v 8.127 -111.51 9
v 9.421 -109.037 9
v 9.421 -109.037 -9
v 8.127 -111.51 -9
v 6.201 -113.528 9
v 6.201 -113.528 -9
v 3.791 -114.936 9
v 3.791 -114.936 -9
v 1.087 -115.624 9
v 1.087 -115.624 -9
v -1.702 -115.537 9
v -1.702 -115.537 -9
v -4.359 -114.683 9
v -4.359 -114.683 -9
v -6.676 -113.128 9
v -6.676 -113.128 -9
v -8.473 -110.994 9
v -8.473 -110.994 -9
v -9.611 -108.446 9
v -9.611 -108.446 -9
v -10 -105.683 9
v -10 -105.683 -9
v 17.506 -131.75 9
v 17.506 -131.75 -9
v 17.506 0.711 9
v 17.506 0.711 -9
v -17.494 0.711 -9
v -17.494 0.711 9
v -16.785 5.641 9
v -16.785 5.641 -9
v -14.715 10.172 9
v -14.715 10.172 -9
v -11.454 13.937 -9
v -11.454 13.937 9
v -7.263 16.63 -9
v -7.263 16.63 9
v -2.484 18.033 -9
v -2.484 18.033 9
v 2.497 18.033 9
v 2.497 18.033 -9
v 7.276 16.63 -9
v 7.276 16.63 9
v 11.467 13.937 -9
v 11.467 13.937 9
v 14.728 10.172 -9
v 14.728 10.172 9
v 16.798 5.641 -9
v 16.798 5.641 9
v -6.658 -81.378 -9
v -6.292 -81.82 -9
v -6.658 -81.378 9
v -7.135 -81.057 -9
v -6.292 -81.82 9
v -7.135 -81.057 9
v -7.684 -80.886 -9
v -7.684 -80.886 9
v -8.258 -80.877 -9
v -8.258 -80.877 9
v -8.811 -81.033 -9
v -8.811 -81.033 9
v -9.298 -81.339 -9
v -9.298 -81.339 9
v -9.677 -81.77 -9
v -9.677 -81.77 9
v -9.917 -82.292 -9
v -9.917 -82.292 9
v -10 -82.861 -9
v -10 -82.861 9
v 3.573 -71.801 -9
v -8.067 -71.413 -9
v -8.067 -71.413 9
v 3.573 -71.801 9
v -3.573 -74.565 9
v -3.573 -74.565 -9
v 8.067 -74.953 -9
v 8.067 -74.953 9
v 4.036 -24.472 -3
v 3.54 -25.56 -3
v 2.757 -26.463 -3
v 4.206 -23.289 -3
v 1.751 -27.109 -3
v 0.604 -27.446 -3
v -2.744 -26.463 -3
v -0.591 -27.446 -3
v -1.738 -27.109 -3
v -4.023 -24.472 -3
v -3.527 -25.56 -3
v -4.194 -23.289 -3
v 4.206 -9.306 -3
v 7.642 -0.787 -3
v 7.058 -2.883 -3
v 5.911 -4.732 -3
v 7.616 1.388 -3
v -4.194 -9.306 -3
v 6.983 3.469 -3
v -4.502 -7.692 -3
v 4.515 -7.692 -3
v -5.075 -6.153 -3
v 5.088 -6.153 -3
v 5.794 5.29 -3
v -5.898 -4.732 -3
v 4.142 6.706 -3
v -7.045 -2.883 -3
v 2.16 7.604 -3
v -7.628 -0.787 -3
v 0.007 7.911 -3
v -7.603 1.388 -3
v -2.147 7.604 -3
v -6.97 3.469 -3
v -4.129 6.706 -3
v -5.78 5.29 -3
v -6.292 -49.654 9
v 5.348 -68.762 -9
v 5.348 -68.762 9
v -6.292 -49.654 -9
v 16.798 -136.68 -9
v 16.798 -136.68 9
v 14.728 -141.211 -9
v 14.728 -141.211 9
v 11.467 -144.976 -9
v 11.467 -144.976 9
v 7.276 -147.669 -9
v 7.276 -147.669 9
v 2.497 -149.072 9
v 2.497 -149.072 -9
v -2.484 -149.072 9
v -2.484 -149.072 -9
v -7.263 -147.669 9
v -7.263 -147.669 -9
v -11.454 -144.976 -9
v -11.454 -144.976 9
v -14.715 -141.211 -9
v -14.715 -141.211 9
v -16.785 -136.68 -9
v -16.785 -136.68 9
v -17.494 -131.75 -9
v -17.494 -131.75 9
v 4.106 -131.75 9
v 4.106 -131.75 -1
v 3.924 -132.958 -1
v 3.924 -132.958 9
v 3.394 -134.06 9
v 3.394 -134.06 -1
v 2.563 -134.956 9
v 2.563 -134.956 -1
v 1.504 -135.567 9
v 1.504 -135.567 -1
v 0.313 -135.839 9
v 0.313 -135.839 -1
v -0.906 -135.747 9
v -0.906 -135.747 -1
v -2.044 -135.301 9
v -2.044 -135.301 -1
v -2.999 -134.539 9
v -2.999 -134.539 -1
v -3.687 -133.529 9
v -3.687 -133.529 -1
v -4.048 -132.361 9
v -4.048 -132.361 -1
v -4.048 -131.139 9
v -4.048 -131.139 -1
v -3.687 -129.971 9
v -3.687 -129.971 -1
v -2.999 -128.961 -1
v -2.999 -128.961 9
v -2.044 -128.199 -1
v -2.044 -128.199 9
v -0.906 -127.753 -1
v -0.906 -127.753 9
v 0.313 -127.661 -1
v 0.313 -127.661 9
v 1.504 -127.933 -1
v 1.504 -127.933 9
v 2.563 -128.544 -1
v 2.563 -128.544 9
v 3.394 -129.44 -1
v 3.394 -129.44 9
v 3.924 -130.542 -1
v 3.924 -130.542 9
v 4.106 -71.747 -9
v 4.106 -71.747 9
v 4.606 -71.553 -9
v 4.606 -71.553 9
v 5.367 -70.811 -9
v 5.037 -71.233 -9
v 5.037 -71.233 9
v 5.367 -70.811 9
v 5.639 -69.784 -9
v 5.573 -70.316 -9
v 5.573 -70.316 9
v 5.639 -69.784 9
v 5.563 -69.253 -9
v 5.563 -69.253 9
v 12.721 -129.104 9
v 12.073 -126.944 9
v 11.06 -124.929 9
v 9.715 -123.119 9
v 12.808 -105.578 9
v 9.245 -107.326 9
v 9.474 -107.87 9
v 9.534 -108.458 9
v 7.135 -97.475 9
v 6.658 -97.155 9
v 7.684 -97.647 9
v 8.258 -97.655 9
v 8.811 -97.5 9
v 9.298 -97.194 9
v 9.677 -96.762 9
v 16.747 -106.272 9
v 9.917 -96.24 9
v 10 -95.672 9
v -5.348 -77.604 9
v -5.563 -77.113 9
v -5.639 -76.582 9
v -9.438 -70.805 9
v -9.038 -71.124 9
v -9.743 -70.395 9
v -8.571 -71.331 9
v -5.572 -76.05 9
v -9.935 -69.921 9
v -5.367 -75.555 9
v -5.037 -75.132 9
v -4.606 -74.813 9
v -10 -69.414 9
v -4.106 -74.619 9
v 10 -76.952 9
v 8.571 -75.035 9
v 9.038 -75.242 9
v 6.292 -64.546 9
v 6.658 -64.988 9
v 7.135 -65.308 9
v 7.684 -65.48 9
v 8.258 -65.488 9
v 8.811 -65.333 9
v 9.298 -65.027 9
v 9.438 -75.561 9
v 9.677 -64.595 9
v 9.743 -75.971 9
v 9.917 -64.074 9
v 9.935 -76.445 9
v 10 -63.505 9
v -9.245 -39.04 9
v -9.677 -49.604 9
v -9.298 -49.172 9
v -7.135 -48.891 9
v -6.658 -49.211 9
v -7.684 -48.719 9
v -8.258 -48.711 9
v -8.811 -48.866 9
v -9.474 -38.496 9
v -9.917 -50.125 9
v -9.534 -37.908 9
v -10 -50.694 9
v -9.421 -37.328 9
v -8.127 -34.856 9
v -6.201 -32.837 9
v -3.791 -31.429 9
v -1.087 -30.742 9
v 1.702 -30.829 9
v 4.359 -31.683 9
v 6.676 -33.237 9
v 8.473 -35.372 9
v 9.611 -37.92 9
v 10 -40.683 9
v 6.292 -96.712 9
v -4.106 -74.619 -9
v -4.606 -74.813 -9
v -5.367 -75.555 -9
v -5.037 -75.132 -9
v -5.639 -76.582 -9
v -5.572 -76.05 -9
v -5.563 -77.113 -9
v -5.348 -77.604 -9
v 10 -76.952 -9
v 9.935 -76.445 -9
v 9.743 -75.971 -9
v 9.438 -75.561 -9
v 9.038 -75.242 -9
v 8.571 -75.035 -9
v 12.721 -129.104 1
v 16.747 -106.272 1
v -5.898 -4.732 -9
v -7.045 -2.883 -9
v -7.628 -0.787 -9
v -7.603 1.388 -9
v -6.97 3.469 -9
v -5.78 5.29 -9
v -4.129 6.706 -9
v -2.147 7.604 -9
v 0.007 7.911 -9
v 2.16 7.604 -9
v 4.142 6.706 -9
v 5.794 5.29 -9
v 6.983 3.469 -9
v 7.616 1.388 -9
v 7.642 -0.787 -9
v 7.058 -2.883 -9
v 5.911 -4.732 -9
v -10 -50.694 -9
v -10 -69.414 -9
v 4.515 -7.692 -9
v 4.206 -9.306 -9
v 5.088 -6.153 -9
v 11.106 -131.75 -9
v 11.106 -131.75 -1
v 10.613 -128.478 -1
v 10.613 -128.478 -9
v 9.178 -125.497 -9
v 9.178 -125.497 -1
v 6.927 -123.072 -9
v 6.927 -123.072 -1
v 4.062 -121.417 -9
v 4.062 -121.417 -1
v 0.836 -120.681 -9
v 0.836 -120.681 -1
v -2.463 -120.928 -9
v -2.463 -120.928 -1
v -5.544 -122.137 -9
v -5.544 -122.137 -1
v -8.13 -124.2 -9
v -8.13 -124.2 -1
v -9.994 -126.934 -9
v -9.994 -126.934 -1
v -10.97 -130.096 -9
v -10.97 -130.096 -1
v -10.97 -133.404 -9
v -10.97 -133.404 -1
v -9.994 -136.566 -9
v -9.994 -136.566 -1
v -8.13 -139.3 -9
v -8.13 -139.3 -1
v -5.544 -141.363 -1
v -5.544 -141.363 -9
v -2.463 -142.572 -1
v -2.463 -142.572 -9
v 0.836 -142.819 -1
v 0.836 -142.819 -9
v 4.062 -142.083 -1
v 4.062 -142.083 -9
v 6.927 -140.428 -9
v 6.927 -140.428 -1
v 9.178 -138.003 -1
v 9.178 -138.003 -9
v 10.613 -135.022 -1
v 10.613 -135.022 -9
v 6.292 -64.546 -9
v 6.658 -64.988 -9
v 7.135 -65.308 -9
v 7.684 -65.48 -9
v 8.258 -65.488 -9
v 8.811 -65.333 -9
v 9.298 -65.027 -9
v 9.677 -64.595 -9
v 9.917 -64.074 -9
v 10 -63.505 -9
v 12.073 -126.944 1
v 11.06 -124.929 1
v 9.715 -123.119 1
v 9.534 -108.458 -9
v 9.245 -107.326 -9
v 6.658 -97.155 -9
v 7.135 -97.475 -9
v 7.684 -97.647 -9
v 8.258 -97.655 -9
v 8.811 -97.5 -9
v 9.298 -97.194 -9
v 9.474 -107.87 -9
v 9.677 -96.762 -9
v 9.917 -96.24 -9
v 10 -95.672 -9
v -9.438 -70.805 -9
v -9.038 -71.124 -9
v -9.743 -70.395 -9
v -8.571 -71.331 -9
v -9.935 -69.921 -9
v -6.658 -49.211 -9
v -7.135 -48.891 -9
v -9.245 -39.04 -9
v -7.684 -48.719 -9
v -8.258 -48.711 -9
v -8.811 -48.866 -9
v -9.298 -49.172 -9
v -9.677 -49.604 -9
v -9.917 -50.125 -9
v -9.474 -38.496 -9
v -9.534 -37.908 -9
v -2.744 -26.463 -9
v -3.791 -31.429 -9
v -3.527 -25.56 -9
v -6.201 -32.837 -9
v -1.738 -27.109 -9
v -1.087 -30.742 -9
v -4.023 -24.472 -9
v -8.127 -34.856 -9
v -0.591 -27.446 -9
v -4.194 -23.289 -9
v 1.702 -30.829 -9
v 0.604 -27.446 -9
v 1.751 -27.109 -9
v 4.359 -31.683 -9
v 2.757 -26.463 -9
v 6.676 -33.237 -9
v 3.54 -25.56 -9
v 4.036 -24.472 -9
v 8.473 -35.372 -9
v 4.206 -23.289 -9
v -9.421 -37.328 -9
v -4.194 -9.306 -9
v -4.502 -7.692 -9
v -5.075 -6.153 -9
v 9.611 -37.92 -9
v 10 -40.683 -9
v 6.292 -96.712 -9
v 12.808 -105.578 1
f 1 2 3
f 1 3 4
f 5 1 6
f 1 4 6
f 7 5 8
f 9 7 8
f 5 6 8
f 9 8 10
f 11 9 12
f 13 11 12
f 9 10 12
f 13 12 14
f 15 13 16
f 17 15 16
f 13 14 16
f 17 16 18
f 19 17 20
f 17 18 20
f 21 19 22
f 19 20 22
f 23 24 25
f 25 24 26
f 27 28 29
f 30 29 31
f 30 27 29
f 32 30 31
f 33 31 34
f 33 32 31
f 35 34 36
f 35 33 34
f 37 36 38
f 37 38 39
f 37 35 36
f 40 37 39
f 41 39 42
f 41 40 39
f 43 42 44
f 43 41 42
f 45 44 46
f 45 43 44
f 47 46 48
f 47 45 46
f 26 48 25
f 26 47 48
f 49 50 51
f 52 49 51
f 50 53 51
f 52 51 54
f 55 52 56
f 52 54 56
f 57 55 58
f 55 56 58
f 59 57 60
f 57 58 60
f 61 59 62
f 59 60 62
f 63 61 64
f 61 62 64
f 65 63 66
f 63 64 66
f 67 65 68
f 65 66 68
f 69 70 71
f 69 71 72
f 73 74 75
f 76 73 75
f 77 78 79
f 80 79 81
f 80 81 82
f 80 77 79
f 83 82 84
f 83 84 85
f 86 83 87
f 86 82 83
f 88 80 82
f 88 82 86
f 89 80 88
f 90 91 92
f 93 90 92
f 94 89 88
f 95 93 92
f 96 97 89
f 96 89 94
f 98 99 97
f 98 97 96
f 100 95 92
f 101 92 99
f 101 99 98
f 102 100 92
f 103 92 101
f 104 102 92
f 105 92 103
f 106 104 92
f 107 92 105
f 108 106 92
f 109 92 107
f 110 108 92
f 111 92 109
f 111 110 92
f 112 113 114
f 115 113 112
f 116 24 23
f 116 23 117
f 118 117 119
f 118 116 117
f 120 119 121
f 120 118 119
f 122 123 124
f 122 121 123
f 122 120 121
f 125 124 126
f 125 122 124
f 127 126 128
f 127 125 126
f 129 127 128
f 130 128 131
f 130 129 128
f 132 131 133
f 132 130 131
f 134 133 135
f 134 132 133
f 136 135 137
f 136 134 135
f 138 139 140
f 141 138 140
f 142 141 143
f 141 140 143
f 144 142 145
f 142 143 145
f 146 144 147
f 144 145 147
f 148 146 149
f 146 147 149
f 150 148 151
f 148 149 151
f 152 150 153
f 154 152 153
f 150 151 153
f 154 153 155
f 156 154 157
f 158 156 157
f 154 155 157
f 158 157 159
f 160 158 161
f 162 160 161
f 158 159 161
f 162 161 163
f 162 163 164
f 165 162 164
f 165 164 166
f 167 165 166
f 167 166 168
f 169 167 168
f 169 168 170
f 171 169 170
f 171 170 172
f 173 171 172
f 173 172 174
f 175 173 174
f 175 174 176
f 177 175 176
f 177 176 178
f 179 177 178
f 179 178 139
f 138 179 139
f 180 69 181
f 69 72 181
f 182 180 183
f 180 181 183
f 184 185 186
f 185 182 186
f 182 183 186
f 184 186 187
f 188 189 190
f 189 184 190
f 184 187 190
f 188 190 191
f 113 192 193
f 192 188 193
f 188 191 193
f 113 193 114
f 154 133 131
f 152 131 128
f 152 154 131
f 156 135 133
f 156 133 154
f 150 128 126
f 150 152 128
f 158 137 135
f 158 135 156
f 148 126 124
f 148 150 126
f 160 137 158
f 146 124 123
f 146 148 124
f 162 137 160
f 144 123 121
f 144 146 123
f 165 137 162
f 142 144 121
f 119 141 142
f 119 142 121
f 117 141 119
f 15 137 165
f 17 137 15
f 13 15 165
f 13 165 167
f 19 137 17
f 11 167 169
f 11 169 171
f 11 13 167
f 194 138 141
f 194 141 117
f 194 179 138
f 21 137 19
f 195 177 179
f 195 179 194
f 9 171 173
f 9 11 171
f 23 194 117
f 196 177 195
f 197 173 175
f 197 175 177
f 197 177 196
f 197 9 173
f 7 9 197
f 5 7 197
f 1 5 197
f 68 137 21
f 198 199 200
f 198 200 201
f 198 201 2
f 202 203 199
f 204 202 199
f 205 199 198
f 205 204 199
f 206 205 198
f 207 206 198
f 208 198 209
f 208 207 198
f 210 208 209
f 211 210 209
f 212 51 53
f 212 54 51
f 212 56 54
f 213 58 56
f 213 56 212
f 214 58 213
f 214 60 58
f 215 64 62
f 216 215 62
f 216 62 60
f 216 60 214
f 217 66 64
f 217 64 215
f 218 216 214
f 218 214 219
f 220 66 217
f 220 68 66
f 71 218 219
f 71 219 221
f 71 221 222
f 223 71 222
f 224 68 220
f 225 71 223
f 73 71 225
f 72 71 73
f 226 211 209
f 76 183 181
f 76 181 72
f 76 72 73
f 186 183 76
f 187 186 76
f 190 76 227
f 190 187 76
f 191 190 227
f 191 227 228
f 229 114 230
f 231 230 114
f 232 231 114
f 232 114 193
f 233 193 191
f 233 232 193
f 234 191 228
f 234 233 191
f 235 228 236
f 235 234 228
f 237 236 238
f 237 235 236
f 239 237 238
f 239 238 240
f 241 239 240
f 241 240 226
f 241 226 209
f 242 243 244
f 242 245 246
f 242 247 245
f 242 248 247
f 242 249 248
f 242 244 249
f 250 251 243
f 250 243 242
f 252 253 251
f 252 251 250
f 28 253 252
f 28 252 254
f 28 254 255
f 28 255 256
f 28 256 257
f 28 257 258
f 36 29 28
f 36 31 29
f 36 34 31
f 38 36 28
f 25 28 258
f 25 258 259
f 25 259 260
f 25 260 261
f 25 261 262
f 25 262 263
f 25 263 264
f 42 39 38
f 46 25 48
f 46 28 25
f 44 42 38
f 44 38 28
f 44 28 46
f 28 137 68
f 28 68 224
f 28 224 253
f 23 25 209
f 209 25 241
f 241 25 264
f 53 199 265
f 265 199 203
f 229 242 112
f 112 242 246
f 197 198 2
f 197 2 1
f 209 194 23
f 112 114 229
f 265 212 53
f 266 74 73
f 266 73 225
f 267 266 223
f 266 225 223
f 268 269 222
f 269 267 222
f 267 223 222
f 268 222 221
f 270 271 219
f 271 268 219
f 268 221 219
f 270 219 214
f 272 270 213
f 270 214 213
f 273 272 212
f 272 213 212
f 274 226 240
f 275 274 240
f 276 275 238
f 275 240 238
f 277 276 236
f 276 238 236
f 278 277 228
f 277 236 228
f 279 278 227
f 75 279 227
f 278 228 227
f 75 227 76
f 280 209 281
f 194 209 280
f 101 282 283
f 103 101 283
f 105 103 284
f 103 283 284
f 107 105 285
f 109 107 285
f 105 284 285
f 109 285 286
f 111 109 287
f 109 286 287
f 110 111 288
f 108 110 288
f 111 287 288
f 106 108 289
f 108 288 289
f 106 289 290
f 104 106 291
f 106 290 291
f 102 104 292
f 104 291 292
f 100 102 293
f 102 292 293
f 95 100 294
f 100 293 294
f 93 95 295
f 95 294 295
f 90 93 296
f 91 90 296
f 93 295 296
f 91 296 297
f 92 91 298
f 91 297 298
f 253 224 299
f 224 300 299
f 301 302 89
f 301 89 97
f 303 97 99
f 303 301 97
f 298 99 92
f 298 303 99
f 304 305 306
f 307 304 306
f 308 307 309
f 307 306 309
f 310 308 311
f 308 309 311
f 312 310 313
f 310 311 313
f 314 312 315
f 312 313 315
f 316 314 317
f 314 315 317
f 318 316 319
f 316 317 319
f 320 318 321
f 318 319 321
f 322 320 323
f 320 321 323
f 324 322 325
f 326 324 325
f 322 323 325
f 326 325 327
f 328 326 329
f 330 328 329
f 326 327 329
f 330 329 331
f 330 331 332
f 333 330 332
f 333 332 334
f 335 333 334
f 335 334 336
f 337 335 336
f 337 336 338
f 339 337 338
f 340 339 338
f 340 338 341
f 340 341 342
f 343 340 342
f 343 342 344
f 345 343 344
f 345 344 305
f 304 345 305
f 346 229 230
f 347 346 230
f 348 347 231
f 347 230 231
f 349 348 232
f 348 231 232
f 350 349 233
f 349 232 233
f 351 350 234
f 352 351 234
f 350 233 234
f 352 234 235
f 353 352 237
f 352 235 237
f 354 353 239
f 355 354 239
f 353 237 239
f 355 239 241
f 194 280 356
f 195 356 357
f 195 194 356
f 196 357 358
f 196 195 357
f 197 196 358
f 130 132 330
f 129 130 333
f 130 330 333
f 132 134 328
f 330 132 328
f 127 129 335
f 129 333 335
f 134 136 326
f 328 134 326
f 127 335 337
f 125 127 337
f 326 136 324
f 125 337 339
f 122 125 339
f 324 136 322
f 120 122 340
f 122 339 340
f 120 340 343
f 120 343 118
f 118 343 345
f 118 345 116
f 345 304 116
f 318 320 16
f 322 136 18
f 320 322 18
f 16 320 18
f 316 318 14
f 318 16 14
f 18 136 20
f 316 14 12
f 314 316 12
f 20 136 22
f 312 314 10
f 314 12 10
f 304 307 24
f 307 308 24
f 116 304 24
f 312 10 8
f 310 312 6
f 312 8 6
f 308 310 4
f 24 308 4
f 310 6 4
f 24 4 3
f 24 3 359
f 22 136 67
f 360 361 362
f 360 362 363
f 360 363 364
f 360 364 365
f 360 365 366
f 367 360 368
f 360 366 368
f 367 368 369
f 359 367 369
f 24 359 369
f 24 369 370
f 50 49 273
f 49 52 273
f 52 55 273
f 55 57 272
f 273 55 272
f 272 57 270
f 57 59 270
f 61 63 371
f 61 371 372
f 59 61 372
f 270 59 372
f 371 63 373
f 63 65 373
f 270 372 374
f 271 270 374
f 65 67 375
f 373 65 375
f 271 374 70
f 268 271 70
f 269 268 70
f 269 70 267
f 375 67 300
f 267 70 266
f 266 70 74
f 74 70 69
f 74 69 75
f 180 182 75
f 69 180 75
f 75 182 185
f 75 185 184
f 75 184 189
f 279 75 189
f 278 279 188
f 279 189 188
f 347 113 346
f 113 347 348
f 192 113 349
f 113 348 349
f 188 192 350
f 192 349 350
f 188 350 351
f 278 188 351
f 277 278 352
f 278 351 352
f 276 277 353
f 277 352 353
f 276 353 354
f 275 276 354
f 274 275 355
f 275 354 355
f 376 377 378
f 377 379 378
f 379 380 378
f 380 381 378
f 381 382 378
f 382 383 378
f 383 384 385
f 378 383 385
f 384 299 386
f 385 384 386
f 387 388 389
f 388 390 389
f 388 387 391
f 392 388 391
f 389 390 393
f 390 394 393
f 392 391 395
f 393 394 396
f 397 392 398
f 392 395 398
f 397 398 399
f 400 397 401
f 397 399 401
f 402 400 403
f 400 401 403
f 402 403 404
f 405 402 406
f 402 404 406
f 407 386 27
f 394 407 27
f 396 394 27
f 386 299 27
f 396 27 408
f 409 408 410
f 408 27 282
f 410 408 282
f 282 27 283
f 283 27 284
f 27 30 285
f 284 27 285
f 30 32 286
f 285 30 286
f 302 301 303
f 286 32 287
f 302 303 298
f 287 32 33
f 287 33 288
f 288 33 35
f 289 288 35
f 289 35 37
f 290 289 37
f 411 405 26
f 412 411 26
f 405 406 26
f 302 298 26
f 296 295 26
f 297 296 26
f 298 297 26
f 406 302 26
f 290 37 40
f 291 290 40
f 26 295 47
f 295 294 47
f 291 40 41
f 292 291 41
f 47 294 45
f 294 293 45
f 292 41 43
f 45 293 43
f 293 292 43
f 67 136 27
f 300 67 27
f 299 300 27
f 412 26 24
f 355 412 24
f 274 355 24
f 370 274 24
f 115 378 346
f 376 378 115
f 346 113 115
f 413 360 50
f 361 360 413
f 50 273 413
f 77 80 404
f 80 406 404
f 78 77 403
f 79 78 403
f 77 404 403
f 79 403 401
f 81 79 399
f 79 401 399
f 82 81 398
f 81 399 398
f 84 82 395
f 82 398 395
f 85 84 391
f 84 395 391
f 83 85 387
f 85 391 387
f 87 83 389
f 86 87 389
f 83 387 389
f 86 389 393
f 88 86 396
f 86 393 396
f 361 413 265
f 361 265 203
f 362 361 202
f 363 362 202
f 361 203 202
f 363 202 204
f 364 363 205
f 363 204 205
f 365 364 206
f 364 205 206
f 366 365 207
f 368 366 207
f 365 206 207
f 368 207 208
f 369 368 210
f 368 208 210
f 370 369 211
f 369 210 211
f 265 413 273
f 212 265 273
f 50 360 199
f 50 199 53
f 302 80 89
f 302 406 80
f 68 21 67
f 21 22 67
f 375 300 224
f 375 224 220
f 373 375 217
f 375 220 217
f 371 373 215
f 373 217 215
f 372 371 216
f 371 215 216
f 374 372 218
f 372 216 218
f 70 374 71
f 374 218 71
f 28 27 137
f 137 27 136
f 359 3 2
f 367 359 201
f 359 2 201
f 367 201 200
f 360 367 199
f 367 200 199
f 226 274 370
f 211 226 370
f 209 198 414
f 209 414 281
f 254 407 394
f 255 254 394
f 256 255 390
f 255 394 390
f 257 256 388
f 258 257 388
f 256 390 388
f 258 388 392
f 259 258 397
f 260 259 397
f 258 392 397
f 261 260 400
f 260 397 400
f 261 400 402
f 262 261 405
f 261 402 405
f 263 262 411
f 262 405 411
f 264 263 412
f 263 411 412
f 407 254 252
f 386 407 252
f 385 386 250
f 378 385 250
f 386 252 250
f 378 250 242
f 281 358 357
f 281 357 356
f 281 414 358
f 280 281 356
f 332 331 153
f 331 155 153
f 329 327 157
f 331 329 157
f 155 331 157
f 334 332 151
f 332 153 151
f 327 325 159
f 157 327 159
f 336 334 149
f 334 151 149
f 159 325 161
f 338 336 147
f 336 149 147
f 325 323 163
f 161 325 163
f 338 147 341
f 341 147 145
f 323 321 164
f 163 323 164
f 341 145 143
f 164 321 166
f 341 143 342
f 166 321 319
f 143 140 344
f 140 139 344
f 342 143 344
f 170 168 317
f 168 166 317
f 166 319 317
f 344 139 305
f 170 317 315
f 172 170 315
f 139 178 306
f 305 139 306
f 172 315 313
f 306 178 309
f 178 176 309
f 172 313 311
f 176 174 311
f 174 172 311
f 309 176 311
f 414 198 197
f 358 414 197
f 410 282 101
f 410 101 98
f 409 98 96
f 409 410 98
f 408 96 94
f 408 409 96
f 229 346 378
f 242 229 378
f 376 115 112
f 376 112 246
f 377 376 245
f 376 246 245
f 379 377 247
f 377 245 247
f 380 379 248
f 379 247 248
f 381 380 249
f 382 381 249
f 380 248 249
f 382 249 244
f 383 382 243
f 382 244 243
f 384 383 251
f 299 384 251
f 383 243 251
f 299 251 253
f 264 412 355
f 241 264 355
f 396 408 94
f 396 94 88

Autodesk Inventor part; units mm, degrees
ref_plane "YZ Plane" through (0, 0, 0) normal (1, 0, 0) x (0, 1, 0)
ref_plane "XZ Plane" through (0, 0, 0) normal (0, 1, 0) x (-1, 0, 0)
ref_plane "XY Plane" through (0, 0, 0) normal (0, 0, 1) x (1, 0, 0)
sketch "Sketch1" plane through (0, 0, 0) normal (0, 0, 1) x (1, 0, 0)
  line L0 (0.0065, 132.461) -> (0.0065, 0) construction
  line L1 (-17.4935, 132.461) -> (-17.4935, 0)
  line L2 (17.5065, 0) -> (17.5065, 132.461)
  arc A0 (17.5065, 132.461) -> (-17.4935, 132.461) centre (0.0065, 132.461) ccw
  arc A1 (-17.4935, 0) -> (17.5065, 0) centre (0.0065, 0) ccw
  circle A2 centre (0.0065, 0) radius 11.1
  circle A3 centre (0.0065, 131.961) radius 7.5
  line L3 (4.0065, 131.961) -> (4.0065, 109.961)
  line L4 (4.0065, 109.961) -> (-3.9935, 109.961)
  line L5 (-3.9935, 109.961) -> (-3.9935, 131.961)
  line L6 (-3.9935, 131.961) -> (4.0065, 131.961)
  line L7 (0.0065, 101.721) -> (0.0065, -30.5)
  line L8 (0.0065, 131.961) -> (5.7519, 127.1401)
  line L9 (0.0065, 131.961) -> (0.0065, 124.461) construction
  arc A4 (5.7519, 127.1401) -> (4.0065, 122.4546) centre (13.9526, 121.4175) ccw
  line L10 (0.0065, 131.961) -> (-5.7388, 127.1401)
  arc A5 (-3.9935, 122.4546) -> (-5.7388, 127.1401) centre (-13.9395, 121.4175) ccw
  line L11 (0.0065, 132.461) -> (0.0065, 108.461) construction
  line L12 (4.0065, 132.461) -> (4.0065, 108.461)
  line L13 (-3.9935, 108.461) -> (-3.9935, 132.461)
  arc A6 (4.0065, 132.461) -> (-3.9935, 132.461) centre (0.0065, 132.461) ccw
  arc A7 (-3.9935, 108.461) -> (4.0065, 108.461) centre (0.0065, 108.461) ccw
  point P0 (0.0065, 131.961)
  point P1 (-3.9935, 122.4546)
  point P2 (-5.7388, 127.1401)
  point P3 (0.0065, 120.461)
  point P4 (-3.9935, 109.961)
  point P5 (4.0065, 109.961)
  dimension "d38" = 15
  dimension "d19" = 35
  dimension "d20" = 22.2
  dimension "d39" = 22
  dimension "d40" = 8
  dimension "d41" = 4
  dimension "d42" = 4
  dimension "d43" = 50
  dimension "d44" = 5
  dimension "d45" = 10
  dimension "d50" = 24
  dimension "d59" = 132.461
extrude "Extrusion1" add sketch "Sketch1" along normal mid plane 6
sketch "Sketch6" plane through (0, 0, 3) normal (0, 0, 1) x (1, 0, 0)
  arc A0 (-17.4935, 0) -> (17.5065, 0) centre (0.0065, 0) ccw projected
  line L0 (17.5065, 0) -> (17.5065, 132.461) projected
  arc A1 (17.5065, 132.461) -> (-17.4935, 132.461) centre (0.0065, 132.461) ccw projected
  line L1 (-17.4935, 132.461) -> (-17.4935, 0) projected
  arc A2 (-3.9935, 108.461) -> (4.0065, 108.461) centre (0.0065, 108.461) ccw projected
  line L2 (-3.9935, 108.461) -> (-3.9935, 122.4546) projected
  arc A3 (-3.9935, 122.4546) -> (-5.7388, 127.1401) centre (-13.9395, 121.4175) ccw projected
  arc A4 (5.7519, 127.1401) -> (-5.7388, 127.1401) centre (0.0065, 131.961) ccw projected
  arc A5 (5.7519, 127.1401) -> (4.0065, 122.4546) centre (13.9526, 121.4175) ccw projected
  line L3 (4.0065, 122.4546) -> (4.0065, 108.461) projected
  circle A6 centre (0.0065, 0) radius 11.1 projected
  point P0 (0, 0)
extrude "Extrusion4" add sketch "Sketch6" along normal blind 2 contours L1 A1 L0 A0 | L2 A3 A4 A5 L3 A2
sketch "Sketch7" plane through (0, 0, 5) normal (0, 0, 1) x (1, 0, 0)
  line L0 (0, 244.3) -> (0, -244.3) projected
  line L1 (17.5065, 0) -> (17.5065, 132.461) projected
  arc A0 (17.5065, 132.461) -> (-17.4935, 132.461) centre (0.0065, 132.461) ccw projected
  line L2 (-17.4935, 132.461) -> (-17.4935, 0) projected
  arc A1 (-17.4935, 0) -> (17.5065, 0) centre (0.0065, 0) ccw projected
  circle A2 centre (0.0065, 0) radius 11.1 projected
  circle A3 centre (0.0065, 0) radius 4.1
  point P0 (0, 0)
  point P1 (0, 11.1)
  point P2 (0, -11.1)
  point P3 (0, -17.5)
  point P4 (0, 149.961)
  dimension "d53" = 8.2
extrude "Extrusion5" add sketch "Sketch7" along normal blind 10 contours A0 L1 A1 L0 A2 | L0 A2 A1 L2 A0 | A2 L0 A3 | L0 A3 A2
sketch "Sketch9" plane through (0, 0, -3) normal (0, 0, -1) x (-1, 0, 0)
  line L0 (-4.0065, 122.4546) -> (-4.0065, 108.461) projected
  arc A0 (-4.0065, 108.461) -> (3.9935, 108.461) centre (-0.0065, 108.461) ccw projected
  line L1 (3.9935, 108.461) -> (3.9935, 122.4546) projected
  arc A1 (5.7388, 127.1401) -> (3.9935, 122.4546) centre (13.9395, 121.4175) ccw projected
  arc A2 (5.7388, 127.1401) -> (-5.7519, 127.1401) centre (-0.0065, 131.961) ccw projected
  arc A3 (-4.0065, 122.4546) -> (-5.7519, 127.1401) centre (-13.9526, 121.4175) ccw projected
  line L2 (4.1935, 122.4442) -> (4.1935, 108.461)
  arc A4 (-4.2065, 108.461) -> (4.1935, 108.461) centre (-0.0065, 108.461) ccw
  line L3 (-4.2065, 108.461) -> (-4.2065, 122.4442)
  arc A5 (-4.2065, 122.4442) -> (-5.9109, 127.0184) centre (-13.9526, 121.4175) ccw
  arc A6 (5.8978, 127.0184) -> (-5.9109, 127.0184) centre (-0.0065, 131.961) ccw
  arc A7 (5.8978, 127.0184) -> (4.1935, 122.4442) centre (13.9395, 121.4175) ccw
  point P0 (0, 0)
  dimension "d60" = 0.2
extrude "Extrusion7" cut sketch "Sketch9" against normal up to surface (6 mm away)
sketch "Sketch11" plane through (0, 0, 15) normal (0, 0, 1) x (1, 0, 0)
  line L0 (10.9002, -1.9232) -> (15.7624, 25.6515)
  line L1 (10.9002, -1.9232) -> (38.9002, -1.9232) construction
  circle A0 centre (-0.0065, 0) radius 11.075
  circle A1 centre (-0.0065, 0) radius 12
  line L2 (16.7472, 25.4778) -> (12.092, -0.9232)
  line L3 (12.8079, 26.1724) -> (7.325, -4.9232)
  circle A2 centre (-0.0065, 0) radius 13
  circle A3 centre (-0.0065, 0) radius 10
  line L4 (12.8079, 26.1724) -> (16.7472, 25.4778)
  point P0 (0, 0)
  point P1 (0, 0)
  point P2 (9.7149, 8.631)
  point P3 (12.7213, 2.6461)
  dimension "d74" = 28
  dimension "d75" = 80
  dimension "d76" = 24
  dimension "d77" = 1
  dimension "d78" = 3
  dimension "d80" = 2
extrude "Extrusion10" cut sketch "Sketch11" against normal blind 8 contours A2 L3 L4 L0 | L0 L4 L2 A2
sketch "Sketch13" plane through (0, 0, -3) normal (0, 0, -1) x (-1, 0, 0)
  line L0 (0, 101.0671) -> (0, 16.0671) construction
  line L1 (-10, 91.0671) -> (-10, 26.0671)
  line L2 (10, 26.0671) -> (10, 91.0671)
  arc A0 (10, 91.0671) -> (-10, 91.0671) centre (0, 91.0671) ccw
  arc A1 (-10, 26.0671) -> (10, 26.0671) centre (0, 26.0671) ccw
  line L3 (10, 26.0671) -> (10, 58.9004)
  line L4 (-10, 91.0671) -> (-10, 58.2338)
  line L5 (-10, 26.0671) -> (10, 58.9004)
  line L6 (10, 58.9004) -> (-10, 58.2338)
  line L7 (-10, 58.2338) -> (10, 91.0671)
  line L8 (33.0369, 58.1675) -> (-10, 56.7329)
  line L9 (32.9369, 61.1658) -> (-10.05, 59.7329)
  line L10 (-8.719, 57.4534) -> (11.281, 90.2868)
  line L11 (-11.281, 59.0141) -> (9.7071, 93.4696)
  line L12 (-9.7071, 23.6646) -> (11.281, 58.1201)
  line L13 (-11.281, 26.8474) -> (8.719, 59.6808)
  point P0 (0, 0)
  point P1 (0, 58.5671)
  point P2 (39.2224, 129.4846)
  point P3 (-10, 61.1171)
  point P4 (-10, 107.6003)
  point P5 (7.2741, 57.3087)
  point P6 (-10, 28.9505)
  point P7 (10, 56.017)
  point P8 (10, 60.4013)
  point P9 (-7.2741, 59.8255)
  point P10 (10, 88.1837)
  dimension "d97" = 20
  dimension "d98" = 65
  dimension "d99" = 32.8333
  dimension "d100" = 32.8333
  dimension "d101" = 1.5
  dimension "d102" = 1.5
  dimension "d103" = 1.5
  dimension "d104" = 1.5
  dimension "d105" = 1.5
  dimension "d106" = 1.5
extrude "Extrusion12" cut sketch "Sketch13" against normal up to next contours L8 L13 L1 | L1 A0 L11 | L10 L2 L9 | L12 L2 A1
fillet "Fillet2" radius 2 10 edges at (-9.7071, 93.4696, 6) (-10, 88.1837, 6) (10, 28.9505, 6) (10, 61.1171, 6) (-7.2741, 57.3087, 6) (-10, 56.017, 6) (9.7071, 23.6646, 6) (-10, 60.4013, 6) (7.2741, 59.8255, 6) (10, 56.7329, 6)
move or copy body "Move1" bodies to move or copy 1 copy no translate (0, -131.75, 0)
move or copy body "Move2" bodies to move or copy 1 copy no translate (0, 0, -6)
properties part number "EslabonRodillaCadera" material "PLA"
